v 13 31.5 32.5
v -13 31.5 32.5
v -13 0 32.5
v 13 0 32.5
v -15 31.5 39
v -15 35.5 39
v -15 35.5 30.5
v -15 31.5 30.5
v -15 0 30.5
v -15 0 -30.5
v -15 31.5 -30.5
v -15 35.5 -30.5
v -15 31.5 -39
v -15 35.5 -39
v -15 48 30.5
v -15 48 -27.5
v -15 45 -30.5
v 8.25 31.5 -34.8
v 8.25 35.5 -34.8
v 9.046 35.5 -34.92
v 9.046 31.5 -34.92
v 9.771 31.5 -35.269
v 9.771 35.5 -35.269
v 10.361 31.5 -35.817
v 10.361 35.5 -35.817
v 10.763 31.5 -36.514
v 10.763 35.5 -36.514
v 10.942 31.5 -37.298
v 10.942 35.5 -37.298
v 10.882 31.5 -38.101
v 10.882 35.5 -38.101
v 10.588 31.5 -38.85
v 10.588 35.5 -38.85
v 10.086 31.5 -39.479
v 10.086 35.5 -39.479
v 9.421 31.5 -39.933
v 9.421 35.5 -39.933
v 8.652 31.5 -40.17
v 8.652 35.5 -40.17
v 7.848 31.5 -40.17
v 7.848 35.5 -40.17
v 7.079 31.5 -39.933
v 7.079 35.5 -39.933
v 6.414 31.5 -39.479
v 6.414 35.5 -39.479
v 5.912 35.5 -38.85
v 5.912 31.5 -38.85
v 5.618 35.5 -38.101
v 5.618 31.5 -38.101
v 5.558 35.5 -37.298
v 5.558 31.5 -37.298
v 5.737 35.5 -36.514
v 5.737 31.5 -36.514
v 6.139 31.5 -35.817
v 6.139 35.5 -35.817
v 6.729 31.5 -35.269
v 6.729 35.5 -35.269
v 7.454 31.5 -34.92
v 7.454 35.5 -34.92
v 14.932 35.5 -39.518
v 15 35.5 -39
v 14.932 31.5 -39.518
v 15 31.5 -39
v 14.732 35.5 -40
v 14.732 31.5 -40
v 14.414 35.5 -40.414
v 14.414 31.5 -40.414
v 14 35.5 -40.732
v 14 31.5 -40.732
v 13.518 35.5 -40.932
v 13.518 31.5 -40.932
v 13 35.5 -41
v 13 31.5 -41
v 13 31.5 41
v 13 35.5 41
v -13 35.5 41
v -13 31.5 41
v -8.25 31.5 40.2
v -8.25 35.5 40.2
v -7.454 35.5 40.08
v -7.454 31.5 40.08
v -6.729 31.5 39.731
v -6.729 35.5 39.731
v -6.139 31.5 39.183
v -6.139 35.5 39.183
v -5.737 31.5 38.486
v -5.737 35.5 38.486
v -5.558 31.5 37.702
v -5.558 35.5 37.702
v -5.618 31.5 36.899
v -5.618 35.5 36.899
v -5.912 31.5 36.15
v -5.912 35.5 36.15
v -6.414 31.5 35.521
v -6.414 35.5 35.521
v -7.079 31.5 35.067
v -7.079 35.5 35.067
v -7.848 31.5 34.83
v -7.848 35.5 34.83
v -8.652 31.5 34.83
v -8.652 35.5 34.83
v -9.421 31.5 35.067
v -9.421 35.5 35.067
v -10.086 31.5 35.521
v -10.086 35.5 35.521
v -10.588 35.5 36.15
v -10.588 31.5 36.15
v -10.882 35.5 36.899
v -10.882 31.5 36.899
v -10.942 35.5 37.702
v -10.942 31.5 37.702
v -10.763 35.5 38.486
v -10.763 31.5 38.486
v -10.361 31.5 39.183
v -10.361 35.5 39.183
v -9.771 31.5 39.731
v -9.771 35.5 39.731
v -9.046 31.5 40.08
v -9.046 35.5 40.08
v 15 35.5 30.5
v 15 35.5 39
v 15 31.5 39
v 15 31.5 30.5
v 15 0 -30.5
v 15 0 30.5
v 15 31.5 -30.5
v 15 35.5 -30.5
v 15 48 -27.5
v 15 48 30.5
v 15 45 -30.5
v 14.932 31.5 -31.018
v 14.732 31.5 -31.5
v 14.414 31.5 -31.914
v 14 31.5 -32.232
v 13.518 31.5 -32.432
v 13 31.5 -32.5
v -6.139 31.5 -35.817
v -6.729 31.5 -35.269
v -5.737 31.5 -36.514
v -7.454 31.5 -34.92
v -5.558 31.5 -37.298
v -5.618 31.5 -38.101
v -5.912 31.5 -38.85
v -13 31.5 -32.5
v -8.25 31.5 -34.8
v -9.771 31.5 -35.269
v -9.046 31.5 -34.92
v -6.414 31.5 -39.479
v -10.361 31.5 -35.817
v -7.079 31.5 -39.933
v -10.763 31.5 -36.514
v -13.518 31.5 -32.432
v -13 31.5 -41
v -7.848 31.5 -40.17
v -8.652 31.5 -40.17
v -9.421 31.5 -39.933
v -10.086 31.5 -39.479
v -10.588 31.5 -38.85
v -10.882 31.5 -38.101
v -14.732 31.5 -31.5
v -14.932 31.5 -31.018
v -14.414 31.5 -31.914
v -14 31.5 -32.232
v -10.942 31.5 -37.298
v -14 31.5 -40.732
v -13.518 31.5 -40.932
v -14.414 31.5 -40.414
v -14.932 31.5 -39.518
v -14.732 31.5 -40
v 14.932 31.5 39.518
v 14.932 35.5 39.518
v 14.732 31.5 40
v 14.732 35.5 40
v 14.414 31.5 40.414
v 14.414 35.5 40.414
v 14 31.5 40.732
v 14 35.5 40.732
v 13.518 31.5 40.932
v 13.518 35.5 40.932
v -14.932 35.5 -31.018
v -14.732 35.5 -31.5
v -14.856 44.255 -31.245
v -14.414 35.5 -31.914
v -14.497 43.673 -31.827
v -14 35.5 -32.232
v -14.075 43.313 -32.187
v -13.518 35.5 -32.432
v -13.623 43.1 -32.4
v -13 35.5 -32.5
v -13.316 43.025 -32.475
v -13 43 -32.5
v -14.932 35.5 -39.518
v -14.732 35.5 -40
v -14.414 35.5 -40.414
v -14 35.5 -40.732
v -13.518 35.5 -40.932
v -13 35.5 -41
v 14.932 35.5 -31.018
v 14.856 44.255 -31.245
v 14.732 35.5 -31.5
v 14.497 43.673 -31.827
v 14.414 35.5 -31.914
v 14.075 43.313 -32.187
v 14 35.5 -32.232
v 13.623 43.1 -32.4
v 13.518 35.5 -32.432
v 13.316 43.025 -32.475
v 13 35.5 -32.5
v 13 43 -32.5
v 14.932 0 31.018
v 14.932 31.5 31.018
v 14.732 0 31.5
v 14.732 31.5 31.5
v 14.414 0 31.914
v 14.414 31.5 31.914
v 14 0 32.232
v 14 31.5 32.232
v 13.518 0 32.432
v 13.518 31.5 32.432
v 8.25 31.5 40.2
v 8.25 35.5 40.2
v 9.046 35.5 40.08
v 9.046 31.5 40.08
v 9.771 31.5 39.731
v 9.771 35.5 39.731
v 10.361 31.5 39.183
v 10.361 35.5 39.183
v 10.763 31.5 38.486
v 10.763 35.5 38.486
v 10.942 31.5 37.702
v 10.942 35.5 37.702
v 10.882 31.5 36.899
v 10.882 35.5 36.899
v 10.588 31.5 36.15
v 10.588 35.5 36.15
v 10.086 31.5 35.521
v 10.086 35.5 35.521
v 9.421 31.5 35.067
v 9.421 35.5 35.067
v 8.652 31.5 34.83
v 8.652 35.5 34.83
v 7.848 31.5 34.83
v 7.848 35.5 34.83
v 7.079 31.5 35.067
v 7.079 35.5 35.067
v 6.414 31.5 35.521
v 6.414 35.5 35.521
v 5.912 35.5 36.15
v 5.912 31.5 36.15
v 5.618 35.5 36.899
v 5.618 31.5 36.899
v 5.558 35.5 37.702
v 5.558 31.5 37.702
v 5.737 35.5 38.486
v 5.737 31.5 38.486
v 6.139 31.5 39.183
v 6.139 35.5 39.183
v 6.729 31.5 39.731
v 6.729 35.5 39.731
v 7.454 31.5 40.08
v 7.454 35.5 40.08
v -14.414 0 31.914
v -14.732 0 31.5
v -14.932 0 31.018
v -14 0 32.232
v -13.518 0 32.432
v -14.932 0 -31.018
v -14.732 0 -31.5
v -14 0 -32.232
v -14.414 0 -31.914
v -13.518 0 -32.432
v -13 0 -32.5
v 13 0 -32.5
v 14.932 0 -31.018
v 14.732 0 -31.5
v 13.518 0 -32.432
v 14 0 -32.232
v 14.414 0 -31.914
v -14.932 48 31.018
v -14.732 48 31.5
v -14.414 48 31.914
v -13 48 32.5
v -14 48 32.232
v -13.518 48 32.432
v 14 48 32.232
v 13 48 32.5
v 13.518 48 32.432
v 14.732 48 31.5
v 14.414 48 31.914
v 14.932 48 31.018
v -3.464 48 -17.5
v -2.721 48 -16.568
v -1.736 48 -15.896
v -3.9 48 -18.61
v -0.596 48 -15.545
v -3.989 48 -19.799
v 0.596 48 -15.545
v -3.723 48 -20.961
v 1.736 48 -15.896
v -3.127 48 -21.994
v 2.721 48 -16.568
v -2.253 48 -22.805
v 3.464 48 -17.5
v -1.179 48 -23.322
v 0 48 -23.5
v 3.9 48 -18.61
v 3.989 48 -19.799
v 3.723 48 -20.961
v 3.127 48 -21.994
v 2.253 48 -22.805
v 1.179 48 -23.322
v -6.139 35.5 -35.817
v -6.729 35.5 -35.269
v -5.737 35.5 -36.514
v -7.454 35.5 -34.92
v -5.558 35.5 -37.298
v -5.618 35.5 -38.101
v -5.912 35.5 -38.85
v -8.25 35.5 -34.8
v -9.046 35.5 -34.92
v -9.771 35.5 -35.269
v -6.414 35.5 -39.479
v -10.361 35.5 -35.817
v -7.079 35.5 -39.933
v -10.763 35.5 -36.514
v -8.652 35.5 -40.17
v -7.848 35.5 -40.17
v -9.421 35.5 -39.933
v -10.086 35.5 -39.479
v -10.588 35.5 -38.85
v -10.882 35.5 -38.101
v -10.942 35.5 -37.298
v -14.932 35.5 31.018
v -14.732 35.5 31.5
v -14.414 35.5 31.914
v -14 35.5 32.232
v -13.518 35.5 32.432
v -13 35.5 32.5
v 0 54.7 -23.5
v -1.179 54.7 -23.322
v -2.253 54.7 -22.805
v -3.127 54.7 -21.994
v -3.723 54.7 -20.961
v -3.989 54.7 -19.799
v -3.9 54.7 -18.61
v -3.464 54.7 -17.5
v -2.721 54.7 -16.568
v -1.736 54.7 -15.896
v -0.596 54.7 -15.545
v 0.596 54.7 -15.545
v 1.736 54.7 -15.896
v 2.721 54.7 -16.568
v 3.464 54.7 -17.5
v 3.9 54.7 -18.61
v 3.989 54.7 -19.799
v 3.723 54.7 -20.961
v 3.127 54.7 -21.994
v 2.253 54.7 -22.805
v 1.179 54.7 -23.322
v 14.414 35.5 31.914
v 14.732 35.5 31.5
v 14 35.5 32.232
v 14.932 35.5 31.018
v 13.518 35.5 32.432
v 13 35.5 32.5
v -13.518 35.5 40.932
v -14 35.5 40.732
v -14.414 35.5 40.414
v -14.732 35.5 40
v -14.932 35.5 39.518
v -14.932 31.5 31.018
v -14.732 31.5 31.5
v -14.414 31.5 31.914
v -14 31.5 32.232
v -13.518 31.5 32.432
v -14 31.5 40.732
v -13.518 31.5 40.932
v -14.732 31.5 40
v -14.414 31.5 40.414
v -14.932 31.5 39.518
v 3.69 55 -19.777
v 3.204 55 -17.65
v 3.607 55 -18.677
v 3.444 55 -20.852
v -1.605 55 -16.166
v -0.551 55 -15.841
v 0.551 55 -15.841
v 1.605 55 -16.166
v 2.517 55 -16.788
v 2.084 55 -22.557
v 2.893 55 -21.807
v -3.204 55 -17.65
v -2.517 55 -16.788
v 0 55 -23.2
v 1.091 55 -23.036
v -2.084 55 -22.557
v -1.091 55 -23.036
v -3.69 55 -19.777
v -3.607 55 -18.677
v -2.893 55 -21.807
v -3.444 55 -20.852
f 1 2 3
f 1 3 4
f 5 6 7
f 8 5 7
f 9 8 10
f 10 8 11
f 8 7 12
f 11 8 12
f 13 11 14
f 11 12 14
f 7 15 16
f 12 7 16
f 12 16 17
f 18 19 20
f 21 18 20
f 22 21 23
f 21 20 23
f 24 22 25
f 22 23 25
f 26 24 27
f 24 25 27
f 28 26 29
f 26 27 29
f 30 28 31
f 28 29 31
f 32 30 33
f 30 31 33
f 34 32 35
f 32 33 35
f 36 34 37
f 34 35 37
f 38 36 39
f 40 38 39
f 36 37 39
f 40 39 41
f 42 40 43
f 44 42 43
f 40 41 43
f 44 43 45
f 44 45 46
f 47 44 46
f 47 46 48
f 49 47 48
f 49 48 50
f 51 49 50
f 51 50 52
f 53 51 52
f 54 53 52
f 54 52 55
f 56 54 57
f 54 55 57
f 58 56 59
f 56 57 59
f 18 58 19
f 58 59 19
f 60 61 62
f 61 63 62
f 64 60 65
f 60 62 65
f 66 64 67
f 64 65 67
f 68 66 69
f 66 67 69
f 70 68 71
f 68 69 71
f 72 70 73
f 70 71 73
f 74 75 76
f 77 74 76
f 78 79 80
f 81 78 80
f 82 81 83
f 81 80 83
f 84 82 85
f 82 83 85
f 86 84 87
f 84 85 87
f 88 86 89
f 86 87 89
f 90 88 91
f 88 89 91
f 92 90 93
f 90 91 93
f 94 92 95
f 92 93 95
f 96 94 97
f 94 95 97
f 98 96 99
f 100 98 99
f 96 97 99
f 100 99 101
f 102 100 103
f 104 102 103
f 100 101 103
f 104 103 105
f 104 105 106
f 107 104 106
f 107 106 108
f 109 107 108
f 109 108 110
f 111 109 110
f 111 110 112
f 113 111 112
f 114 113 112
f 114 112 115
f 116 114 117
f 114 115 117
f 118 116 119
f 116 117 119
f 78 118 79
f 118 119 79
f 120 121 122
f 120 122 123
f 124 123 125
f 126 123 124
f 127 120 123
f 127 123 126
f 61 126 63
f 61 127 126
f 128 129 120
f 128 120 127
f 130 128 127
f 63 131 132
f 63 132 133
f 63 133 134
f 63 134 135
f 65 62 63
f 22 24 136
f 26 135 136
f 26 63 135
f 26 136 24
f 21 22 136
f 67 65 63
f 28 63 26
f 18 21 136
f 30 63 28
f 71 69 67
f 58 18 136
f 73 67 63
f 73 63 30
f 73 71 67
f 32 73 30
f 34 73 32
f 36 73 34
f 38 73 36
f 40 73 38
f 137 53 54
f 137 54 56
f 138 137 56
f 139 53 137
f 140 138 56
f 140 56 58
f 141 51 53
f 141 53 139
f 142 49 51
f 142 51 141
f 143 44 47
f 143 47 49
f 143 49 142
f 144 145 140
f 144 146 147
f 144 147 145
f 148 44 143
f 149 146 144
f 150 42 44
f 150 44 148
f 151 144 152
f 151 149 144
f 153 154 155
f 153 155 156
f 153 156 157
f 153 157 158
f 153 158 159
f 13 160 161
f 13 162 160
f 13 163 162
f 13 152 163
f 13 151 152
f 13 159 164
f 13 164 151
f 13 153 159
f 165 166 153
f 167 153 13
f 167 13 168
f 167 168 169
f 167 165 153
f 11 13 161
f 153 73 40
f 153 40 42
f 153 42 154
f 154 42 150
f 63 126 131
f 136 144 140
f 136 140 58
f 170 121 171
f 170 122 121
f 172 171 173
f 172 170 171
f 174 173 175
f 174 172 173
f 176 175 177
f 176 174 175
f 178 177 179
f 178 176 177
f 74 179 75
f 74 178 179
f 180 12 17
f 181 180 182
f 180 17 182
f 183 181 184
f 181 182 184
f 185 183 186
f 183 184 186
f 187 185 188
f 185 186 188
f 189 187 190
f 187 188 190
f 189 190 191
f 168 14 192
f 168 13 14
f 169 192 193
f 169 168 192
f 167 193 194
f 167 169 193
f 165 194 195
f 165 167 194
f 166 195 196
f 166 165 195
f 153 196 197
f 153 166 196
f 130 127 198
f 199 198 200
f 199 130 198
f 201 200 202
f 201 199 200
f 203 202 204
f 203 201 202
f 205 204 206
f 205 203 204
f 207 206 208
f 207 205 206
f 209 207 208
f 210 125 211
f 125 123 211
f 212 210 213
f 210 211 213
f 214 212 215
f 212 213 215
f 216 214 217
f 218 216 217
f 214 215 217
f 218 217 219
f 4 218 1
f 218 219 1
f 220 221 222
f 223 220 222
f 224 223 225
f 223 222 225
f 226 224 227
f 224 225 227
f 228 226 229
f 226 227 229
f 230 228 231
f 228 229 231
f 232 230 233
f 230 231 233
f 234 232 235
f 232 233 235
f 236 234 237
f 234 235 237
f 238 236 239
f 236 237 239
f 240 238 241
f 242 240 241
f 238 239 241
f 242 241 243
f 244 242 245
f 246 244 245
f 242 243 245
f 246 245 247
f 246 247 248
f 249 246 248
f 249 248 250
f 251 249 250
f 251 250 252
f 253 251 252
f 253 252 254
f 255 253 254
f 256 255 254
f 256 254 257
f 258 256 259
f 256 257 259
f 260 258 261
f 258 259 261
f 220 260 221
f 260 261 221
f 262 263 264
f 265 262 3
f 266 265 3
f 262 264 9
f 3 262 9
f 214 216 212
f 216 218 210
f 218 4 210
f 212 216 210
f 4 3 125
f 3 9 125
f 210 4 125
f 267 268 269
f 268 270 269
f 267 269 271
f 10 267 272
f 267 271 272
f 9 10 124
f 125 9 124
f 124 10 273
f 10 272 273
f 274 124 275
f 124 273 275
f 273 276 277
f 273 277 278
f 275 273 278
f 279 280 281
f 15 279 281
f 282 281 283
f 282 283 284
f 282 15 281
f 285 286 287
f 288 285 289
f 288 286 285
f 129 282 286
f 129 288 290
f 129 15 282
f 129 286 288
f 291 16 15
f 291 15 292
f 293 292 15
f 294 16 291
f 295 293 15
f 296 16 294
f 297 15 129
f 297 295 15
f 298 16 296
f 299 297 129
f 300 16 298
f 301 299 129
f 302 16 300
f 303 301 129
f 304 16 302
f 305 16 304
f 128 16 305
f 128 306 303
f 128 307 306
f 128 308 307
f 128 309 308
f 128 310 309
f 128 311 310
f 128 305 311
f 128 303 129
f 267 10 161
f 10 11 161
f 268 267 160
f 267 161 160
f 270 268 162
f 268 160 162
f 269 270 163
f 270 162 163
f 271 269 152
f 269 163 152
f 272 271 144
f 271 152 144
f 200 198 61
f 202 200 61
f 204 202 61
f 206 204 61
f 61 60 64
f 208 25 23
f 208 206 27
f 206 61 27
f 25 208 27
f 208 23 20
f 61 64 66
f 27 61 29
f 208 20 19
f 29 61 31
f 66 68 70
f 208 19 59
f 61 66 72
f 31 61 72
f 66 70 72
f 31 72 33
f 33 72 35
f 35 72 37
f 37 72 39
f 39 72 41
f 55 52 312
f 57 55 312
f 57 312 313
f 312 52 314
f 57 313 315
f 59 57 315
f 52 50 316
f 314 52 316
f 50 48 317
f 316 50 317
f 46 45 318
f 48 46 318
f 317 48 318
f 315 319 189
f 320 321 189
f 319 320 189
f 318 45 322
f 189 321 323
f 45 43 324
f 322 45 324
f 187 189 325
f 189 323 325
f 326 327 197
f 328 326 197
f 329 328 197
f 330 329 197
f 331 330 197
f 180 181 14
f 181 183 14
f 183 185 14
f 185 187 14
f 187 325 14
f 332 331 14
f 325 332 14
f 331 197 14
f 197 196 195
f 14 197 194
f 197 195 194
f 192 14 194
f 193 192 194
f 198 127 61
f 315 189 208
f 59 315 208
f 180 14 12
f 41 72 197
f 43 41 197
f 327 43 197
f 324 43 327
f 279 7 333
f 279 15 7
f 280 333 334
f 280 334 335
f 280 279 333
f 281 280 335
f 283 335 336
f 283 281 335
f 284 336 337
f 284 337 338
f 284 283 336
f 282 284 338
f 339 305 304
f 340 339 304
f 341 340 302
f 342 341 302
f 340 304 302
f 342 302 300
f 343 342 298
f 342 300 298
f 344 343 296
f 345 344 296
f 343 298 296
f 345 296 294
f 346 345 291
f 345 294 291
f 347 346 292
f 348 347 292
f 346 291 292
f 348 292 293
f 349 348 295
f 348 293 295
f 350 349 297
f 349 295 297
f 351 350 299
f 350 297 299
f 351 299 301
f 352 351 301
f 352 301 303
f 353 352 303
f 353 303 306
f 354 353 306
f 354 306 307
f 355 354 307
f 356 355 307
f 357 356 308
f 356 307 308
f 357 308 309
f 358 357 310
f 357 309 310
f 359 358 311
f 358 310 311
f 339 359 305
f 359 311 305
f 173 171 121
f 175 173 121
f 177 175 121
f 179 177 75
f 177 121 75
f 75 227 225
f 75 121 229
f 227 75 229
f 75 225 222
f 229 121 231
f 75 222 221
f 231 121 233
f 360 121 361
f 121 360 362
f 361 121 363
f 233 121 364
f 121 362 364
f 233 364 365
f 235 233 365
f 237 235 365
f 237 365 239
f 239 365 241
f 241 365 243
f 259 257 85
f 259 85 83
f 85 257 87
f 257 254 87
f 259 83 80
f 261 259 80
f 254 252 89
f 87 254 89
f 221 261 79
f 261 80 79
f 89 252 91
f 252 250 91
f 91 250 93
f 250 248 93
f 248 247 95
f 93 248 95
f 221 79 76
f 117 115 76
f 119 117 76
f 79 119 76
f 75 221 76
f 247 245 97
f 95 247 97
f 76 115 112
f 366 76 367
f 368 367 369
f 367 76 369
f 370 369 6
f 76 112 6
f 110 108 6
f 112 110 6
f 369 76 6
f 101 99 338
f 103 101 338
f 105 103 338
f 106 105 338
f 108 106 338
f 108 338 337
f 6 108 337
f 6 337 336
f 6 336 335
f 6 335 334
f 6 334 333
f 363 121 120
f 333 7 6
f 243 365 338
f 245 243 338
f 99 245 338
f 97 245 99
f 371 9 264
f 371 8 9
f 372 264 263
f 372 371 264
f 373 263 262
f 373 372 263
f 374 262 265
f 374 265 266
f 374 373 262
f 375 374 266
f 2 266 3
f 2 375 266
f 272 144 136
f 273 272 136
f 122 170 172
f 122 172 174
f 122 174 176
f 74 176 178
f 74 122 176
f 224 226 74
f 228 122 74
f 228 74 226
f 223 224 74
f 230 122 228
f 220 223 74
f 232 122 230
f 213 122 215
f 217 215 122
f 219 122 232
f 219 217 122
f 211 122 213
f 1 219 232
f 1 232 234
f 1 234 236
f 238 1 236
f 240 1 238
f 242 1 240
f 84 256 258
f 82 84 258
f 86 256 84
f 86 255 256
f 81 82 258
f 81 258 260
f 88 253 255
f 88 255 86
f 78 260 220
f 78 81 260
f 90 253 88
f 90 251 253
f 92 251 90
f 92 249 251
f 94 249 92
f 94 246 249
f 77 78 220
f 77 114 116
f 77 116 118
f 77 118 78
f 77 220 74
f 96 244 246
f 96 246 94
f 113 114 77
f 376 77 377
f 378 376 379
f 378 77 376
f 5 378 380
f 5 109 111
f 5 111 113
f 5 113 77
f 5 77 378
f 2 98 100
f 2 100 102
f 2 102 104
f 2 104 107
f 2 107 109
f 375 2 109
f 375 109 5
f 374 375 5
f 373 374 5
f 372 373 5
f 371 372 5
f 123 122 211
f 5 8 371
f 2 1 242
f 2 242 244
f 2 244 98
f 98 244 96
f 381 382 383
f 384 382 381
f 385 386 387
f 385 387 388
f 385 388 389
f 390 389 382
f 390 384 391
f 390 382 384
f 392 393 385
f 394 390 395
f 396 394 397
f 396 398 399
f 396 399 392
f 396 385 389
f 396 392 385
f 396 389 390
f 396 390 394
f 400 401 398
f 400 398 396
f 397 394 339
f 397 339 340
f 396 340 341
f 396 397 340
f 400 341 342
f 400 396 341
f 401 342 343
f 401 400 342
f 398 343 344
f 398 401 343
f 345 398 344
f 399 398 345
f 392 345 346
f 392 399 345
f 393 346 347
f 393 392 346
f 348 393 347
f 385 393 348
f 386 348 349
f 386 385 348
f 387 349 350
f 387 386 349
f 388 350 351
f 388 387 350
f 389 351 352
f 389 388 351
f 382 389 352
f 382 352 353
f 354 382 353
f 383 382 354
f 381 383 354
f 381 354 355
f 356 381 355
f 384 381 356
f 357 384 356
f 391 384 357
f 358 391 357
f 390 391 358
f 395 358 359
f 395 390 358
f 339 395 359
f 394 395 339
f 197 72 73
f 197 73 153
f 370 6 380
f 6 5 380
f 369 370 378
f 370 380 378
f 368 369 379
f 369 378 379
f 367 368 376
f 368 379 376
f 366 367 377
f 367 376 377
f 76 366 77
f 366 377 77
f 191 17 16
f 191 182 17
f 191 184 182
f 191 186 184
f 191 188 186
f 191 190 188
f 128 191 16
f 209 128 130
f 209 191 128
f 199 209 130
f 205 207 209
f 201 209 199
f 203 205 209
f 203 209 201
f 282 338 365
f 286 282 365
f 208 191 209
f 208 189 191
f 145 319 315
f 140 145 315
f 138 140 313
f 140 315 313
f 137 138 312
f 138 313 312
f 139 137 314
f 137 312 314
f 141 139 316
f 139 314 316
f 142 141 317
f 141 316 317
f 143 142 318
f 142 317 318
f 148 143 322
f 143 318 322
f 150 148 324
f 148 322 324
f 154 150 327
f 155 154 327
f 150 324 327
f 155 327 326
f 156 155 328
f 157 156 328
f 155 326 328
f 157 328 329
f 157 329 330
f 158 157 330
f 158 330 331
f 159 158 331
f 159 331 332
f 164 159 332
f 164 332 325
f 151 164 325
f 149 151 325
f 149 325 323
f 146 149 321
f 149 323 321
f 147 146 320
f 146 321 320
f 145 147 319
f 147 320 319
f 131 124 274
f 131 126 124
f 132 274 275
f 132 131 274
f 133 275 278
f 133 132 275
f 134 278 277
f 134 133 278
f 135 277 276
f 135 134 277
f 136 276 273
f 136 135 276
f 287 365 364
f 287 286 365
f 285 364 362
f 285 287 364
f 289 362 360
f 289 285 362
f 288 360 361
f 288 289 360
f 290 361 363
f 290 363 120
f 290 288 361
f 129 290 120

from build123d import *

# Parameters (mm, degrees)
SKETCH_1_W          = 30
SKETCH_1_H          = 65
EXTRUDE_1_DEPTH     = 48
SKETCH_2_W          = 30
SKETCH_2_H          = 82
EXTRUDE_2_DEPTH     = 4
SKETCH_3_R          = 2.7
CUT_EXTRUDE_1_DEPTH = 4
SKETCH_4_R          = 4
EXTRUDE_3_DEPTH     = 7
CHAMFER_1_SIZE      = 0.3
FILLET_1_R          = 2
CHAMFER_2_SIZE      = 5
FILLET_2_R          = 2


with BuildPart() as part:
    # 草图1 → 凸台-拉伸1 (new body)
    with BuildSketch(Plane(origin=(0, 0, 0), x_dir=(1, 0, 0), z_dir=(0, 1, 0))):
        Rectangle(SKETCH_1_W, SKETCH_1_H)
    extrude(amount=EXTRUDE_1_DEPTH)

    # 草图2 → 凸台-拉伸2 (add)
    with BuildSketch(Plane(origin=(0, 35.5, 0), x_dir=(-1, 0, 0), z_dir=(0, -1, 0))):
        Rectangle(SKETCH_2_W, SKETCH_2_H)
    extrude(amount=EXTRUDE_2_DEPTH)

    # 草图3 → 切除-拉伸1 (cut)
    with BuildSketch(Plane(origin=(0, 35.5, 0), x_dir=(1, 0, 0), z_dir=(0, 1, 0))):
        with Locations(Location((-8.25, 37.5, 0), (0, 0, 270))):
            Circle(SKETCH_3_R)
        with Locations(Location((8.25, 37.5, 0), (0, 0, 270))):
            Circle(SKETCH_3_R)
        with Locations(Location((8.25, -37.5, 0), (0, 0, 270))):
            Circle(SKETCH_3_R)
        with Locations(Location((-8.25, -37.5, 0), (0, 0, 270))):
            Circle(SKETCH_3_R)
    extrude(amount=-CUT_EXTRUDE_1_DEPTH, mode=Mode.SUBTRACT)

    # 草图4 → 凸台-拉伸3 (add)
    with BuildSketch(Plane(origin=(0, 48, 0), x_dir=(1, 0, 0), z_dir=(0, 1, 0))):
        with Locations(Location((0, 19.5, 0), (0, 0, 90))):
            Circle(SKETCH_4_R)
    extrude(amount=EXTRUDE_3_DEPTH)

    # 倒角1
    chamfer_1_edges = [part.edges().sort_by_distance(p)[0] for p in [
        (0, 55, -15.5),
    ]]
    chamfer(chamfer_1_edges, length=CHAMFER_1_SIZE)

    # 圆角1
    fillet_1_edges = [part.edges().sort_by_distance(p)[0] for p in [
        (15, 15.75, 32.5),
        (-15, 15.75, 32.5),
        (-15, 15.75, -32.5),
        (15, 15.75, -32.5),
        (15, 41.75, 32.5),
        (-15, 41.75, 32.5),
    ]]
    fillet(fillet_1_edges, radius=FILLET_1_R)

    # 倒角2
    chamfer_2_edges = [part.edges().sort_by_distance(p)[0] for p in [
        (0, 48, -32.5),
    ]]
    chamfer(chamfer_2_edges, length=CHAMFER_2_SIZE)

    # 圆角2
    fillet_2_edges = [part.edges().sort_by_distance(p)[0] for p in [
        (-15, 39.25, -32.5),
        (15, 39.25, -32.5),
        (15, 33.5, -41),
        (-15, 33.5, 41),
        (15, 33.5, 41),
        (-15, 33.5, -41),
    ]]
    fillet(fillet_2_edges, radius=FILLET_2_R)


solid = part.part
